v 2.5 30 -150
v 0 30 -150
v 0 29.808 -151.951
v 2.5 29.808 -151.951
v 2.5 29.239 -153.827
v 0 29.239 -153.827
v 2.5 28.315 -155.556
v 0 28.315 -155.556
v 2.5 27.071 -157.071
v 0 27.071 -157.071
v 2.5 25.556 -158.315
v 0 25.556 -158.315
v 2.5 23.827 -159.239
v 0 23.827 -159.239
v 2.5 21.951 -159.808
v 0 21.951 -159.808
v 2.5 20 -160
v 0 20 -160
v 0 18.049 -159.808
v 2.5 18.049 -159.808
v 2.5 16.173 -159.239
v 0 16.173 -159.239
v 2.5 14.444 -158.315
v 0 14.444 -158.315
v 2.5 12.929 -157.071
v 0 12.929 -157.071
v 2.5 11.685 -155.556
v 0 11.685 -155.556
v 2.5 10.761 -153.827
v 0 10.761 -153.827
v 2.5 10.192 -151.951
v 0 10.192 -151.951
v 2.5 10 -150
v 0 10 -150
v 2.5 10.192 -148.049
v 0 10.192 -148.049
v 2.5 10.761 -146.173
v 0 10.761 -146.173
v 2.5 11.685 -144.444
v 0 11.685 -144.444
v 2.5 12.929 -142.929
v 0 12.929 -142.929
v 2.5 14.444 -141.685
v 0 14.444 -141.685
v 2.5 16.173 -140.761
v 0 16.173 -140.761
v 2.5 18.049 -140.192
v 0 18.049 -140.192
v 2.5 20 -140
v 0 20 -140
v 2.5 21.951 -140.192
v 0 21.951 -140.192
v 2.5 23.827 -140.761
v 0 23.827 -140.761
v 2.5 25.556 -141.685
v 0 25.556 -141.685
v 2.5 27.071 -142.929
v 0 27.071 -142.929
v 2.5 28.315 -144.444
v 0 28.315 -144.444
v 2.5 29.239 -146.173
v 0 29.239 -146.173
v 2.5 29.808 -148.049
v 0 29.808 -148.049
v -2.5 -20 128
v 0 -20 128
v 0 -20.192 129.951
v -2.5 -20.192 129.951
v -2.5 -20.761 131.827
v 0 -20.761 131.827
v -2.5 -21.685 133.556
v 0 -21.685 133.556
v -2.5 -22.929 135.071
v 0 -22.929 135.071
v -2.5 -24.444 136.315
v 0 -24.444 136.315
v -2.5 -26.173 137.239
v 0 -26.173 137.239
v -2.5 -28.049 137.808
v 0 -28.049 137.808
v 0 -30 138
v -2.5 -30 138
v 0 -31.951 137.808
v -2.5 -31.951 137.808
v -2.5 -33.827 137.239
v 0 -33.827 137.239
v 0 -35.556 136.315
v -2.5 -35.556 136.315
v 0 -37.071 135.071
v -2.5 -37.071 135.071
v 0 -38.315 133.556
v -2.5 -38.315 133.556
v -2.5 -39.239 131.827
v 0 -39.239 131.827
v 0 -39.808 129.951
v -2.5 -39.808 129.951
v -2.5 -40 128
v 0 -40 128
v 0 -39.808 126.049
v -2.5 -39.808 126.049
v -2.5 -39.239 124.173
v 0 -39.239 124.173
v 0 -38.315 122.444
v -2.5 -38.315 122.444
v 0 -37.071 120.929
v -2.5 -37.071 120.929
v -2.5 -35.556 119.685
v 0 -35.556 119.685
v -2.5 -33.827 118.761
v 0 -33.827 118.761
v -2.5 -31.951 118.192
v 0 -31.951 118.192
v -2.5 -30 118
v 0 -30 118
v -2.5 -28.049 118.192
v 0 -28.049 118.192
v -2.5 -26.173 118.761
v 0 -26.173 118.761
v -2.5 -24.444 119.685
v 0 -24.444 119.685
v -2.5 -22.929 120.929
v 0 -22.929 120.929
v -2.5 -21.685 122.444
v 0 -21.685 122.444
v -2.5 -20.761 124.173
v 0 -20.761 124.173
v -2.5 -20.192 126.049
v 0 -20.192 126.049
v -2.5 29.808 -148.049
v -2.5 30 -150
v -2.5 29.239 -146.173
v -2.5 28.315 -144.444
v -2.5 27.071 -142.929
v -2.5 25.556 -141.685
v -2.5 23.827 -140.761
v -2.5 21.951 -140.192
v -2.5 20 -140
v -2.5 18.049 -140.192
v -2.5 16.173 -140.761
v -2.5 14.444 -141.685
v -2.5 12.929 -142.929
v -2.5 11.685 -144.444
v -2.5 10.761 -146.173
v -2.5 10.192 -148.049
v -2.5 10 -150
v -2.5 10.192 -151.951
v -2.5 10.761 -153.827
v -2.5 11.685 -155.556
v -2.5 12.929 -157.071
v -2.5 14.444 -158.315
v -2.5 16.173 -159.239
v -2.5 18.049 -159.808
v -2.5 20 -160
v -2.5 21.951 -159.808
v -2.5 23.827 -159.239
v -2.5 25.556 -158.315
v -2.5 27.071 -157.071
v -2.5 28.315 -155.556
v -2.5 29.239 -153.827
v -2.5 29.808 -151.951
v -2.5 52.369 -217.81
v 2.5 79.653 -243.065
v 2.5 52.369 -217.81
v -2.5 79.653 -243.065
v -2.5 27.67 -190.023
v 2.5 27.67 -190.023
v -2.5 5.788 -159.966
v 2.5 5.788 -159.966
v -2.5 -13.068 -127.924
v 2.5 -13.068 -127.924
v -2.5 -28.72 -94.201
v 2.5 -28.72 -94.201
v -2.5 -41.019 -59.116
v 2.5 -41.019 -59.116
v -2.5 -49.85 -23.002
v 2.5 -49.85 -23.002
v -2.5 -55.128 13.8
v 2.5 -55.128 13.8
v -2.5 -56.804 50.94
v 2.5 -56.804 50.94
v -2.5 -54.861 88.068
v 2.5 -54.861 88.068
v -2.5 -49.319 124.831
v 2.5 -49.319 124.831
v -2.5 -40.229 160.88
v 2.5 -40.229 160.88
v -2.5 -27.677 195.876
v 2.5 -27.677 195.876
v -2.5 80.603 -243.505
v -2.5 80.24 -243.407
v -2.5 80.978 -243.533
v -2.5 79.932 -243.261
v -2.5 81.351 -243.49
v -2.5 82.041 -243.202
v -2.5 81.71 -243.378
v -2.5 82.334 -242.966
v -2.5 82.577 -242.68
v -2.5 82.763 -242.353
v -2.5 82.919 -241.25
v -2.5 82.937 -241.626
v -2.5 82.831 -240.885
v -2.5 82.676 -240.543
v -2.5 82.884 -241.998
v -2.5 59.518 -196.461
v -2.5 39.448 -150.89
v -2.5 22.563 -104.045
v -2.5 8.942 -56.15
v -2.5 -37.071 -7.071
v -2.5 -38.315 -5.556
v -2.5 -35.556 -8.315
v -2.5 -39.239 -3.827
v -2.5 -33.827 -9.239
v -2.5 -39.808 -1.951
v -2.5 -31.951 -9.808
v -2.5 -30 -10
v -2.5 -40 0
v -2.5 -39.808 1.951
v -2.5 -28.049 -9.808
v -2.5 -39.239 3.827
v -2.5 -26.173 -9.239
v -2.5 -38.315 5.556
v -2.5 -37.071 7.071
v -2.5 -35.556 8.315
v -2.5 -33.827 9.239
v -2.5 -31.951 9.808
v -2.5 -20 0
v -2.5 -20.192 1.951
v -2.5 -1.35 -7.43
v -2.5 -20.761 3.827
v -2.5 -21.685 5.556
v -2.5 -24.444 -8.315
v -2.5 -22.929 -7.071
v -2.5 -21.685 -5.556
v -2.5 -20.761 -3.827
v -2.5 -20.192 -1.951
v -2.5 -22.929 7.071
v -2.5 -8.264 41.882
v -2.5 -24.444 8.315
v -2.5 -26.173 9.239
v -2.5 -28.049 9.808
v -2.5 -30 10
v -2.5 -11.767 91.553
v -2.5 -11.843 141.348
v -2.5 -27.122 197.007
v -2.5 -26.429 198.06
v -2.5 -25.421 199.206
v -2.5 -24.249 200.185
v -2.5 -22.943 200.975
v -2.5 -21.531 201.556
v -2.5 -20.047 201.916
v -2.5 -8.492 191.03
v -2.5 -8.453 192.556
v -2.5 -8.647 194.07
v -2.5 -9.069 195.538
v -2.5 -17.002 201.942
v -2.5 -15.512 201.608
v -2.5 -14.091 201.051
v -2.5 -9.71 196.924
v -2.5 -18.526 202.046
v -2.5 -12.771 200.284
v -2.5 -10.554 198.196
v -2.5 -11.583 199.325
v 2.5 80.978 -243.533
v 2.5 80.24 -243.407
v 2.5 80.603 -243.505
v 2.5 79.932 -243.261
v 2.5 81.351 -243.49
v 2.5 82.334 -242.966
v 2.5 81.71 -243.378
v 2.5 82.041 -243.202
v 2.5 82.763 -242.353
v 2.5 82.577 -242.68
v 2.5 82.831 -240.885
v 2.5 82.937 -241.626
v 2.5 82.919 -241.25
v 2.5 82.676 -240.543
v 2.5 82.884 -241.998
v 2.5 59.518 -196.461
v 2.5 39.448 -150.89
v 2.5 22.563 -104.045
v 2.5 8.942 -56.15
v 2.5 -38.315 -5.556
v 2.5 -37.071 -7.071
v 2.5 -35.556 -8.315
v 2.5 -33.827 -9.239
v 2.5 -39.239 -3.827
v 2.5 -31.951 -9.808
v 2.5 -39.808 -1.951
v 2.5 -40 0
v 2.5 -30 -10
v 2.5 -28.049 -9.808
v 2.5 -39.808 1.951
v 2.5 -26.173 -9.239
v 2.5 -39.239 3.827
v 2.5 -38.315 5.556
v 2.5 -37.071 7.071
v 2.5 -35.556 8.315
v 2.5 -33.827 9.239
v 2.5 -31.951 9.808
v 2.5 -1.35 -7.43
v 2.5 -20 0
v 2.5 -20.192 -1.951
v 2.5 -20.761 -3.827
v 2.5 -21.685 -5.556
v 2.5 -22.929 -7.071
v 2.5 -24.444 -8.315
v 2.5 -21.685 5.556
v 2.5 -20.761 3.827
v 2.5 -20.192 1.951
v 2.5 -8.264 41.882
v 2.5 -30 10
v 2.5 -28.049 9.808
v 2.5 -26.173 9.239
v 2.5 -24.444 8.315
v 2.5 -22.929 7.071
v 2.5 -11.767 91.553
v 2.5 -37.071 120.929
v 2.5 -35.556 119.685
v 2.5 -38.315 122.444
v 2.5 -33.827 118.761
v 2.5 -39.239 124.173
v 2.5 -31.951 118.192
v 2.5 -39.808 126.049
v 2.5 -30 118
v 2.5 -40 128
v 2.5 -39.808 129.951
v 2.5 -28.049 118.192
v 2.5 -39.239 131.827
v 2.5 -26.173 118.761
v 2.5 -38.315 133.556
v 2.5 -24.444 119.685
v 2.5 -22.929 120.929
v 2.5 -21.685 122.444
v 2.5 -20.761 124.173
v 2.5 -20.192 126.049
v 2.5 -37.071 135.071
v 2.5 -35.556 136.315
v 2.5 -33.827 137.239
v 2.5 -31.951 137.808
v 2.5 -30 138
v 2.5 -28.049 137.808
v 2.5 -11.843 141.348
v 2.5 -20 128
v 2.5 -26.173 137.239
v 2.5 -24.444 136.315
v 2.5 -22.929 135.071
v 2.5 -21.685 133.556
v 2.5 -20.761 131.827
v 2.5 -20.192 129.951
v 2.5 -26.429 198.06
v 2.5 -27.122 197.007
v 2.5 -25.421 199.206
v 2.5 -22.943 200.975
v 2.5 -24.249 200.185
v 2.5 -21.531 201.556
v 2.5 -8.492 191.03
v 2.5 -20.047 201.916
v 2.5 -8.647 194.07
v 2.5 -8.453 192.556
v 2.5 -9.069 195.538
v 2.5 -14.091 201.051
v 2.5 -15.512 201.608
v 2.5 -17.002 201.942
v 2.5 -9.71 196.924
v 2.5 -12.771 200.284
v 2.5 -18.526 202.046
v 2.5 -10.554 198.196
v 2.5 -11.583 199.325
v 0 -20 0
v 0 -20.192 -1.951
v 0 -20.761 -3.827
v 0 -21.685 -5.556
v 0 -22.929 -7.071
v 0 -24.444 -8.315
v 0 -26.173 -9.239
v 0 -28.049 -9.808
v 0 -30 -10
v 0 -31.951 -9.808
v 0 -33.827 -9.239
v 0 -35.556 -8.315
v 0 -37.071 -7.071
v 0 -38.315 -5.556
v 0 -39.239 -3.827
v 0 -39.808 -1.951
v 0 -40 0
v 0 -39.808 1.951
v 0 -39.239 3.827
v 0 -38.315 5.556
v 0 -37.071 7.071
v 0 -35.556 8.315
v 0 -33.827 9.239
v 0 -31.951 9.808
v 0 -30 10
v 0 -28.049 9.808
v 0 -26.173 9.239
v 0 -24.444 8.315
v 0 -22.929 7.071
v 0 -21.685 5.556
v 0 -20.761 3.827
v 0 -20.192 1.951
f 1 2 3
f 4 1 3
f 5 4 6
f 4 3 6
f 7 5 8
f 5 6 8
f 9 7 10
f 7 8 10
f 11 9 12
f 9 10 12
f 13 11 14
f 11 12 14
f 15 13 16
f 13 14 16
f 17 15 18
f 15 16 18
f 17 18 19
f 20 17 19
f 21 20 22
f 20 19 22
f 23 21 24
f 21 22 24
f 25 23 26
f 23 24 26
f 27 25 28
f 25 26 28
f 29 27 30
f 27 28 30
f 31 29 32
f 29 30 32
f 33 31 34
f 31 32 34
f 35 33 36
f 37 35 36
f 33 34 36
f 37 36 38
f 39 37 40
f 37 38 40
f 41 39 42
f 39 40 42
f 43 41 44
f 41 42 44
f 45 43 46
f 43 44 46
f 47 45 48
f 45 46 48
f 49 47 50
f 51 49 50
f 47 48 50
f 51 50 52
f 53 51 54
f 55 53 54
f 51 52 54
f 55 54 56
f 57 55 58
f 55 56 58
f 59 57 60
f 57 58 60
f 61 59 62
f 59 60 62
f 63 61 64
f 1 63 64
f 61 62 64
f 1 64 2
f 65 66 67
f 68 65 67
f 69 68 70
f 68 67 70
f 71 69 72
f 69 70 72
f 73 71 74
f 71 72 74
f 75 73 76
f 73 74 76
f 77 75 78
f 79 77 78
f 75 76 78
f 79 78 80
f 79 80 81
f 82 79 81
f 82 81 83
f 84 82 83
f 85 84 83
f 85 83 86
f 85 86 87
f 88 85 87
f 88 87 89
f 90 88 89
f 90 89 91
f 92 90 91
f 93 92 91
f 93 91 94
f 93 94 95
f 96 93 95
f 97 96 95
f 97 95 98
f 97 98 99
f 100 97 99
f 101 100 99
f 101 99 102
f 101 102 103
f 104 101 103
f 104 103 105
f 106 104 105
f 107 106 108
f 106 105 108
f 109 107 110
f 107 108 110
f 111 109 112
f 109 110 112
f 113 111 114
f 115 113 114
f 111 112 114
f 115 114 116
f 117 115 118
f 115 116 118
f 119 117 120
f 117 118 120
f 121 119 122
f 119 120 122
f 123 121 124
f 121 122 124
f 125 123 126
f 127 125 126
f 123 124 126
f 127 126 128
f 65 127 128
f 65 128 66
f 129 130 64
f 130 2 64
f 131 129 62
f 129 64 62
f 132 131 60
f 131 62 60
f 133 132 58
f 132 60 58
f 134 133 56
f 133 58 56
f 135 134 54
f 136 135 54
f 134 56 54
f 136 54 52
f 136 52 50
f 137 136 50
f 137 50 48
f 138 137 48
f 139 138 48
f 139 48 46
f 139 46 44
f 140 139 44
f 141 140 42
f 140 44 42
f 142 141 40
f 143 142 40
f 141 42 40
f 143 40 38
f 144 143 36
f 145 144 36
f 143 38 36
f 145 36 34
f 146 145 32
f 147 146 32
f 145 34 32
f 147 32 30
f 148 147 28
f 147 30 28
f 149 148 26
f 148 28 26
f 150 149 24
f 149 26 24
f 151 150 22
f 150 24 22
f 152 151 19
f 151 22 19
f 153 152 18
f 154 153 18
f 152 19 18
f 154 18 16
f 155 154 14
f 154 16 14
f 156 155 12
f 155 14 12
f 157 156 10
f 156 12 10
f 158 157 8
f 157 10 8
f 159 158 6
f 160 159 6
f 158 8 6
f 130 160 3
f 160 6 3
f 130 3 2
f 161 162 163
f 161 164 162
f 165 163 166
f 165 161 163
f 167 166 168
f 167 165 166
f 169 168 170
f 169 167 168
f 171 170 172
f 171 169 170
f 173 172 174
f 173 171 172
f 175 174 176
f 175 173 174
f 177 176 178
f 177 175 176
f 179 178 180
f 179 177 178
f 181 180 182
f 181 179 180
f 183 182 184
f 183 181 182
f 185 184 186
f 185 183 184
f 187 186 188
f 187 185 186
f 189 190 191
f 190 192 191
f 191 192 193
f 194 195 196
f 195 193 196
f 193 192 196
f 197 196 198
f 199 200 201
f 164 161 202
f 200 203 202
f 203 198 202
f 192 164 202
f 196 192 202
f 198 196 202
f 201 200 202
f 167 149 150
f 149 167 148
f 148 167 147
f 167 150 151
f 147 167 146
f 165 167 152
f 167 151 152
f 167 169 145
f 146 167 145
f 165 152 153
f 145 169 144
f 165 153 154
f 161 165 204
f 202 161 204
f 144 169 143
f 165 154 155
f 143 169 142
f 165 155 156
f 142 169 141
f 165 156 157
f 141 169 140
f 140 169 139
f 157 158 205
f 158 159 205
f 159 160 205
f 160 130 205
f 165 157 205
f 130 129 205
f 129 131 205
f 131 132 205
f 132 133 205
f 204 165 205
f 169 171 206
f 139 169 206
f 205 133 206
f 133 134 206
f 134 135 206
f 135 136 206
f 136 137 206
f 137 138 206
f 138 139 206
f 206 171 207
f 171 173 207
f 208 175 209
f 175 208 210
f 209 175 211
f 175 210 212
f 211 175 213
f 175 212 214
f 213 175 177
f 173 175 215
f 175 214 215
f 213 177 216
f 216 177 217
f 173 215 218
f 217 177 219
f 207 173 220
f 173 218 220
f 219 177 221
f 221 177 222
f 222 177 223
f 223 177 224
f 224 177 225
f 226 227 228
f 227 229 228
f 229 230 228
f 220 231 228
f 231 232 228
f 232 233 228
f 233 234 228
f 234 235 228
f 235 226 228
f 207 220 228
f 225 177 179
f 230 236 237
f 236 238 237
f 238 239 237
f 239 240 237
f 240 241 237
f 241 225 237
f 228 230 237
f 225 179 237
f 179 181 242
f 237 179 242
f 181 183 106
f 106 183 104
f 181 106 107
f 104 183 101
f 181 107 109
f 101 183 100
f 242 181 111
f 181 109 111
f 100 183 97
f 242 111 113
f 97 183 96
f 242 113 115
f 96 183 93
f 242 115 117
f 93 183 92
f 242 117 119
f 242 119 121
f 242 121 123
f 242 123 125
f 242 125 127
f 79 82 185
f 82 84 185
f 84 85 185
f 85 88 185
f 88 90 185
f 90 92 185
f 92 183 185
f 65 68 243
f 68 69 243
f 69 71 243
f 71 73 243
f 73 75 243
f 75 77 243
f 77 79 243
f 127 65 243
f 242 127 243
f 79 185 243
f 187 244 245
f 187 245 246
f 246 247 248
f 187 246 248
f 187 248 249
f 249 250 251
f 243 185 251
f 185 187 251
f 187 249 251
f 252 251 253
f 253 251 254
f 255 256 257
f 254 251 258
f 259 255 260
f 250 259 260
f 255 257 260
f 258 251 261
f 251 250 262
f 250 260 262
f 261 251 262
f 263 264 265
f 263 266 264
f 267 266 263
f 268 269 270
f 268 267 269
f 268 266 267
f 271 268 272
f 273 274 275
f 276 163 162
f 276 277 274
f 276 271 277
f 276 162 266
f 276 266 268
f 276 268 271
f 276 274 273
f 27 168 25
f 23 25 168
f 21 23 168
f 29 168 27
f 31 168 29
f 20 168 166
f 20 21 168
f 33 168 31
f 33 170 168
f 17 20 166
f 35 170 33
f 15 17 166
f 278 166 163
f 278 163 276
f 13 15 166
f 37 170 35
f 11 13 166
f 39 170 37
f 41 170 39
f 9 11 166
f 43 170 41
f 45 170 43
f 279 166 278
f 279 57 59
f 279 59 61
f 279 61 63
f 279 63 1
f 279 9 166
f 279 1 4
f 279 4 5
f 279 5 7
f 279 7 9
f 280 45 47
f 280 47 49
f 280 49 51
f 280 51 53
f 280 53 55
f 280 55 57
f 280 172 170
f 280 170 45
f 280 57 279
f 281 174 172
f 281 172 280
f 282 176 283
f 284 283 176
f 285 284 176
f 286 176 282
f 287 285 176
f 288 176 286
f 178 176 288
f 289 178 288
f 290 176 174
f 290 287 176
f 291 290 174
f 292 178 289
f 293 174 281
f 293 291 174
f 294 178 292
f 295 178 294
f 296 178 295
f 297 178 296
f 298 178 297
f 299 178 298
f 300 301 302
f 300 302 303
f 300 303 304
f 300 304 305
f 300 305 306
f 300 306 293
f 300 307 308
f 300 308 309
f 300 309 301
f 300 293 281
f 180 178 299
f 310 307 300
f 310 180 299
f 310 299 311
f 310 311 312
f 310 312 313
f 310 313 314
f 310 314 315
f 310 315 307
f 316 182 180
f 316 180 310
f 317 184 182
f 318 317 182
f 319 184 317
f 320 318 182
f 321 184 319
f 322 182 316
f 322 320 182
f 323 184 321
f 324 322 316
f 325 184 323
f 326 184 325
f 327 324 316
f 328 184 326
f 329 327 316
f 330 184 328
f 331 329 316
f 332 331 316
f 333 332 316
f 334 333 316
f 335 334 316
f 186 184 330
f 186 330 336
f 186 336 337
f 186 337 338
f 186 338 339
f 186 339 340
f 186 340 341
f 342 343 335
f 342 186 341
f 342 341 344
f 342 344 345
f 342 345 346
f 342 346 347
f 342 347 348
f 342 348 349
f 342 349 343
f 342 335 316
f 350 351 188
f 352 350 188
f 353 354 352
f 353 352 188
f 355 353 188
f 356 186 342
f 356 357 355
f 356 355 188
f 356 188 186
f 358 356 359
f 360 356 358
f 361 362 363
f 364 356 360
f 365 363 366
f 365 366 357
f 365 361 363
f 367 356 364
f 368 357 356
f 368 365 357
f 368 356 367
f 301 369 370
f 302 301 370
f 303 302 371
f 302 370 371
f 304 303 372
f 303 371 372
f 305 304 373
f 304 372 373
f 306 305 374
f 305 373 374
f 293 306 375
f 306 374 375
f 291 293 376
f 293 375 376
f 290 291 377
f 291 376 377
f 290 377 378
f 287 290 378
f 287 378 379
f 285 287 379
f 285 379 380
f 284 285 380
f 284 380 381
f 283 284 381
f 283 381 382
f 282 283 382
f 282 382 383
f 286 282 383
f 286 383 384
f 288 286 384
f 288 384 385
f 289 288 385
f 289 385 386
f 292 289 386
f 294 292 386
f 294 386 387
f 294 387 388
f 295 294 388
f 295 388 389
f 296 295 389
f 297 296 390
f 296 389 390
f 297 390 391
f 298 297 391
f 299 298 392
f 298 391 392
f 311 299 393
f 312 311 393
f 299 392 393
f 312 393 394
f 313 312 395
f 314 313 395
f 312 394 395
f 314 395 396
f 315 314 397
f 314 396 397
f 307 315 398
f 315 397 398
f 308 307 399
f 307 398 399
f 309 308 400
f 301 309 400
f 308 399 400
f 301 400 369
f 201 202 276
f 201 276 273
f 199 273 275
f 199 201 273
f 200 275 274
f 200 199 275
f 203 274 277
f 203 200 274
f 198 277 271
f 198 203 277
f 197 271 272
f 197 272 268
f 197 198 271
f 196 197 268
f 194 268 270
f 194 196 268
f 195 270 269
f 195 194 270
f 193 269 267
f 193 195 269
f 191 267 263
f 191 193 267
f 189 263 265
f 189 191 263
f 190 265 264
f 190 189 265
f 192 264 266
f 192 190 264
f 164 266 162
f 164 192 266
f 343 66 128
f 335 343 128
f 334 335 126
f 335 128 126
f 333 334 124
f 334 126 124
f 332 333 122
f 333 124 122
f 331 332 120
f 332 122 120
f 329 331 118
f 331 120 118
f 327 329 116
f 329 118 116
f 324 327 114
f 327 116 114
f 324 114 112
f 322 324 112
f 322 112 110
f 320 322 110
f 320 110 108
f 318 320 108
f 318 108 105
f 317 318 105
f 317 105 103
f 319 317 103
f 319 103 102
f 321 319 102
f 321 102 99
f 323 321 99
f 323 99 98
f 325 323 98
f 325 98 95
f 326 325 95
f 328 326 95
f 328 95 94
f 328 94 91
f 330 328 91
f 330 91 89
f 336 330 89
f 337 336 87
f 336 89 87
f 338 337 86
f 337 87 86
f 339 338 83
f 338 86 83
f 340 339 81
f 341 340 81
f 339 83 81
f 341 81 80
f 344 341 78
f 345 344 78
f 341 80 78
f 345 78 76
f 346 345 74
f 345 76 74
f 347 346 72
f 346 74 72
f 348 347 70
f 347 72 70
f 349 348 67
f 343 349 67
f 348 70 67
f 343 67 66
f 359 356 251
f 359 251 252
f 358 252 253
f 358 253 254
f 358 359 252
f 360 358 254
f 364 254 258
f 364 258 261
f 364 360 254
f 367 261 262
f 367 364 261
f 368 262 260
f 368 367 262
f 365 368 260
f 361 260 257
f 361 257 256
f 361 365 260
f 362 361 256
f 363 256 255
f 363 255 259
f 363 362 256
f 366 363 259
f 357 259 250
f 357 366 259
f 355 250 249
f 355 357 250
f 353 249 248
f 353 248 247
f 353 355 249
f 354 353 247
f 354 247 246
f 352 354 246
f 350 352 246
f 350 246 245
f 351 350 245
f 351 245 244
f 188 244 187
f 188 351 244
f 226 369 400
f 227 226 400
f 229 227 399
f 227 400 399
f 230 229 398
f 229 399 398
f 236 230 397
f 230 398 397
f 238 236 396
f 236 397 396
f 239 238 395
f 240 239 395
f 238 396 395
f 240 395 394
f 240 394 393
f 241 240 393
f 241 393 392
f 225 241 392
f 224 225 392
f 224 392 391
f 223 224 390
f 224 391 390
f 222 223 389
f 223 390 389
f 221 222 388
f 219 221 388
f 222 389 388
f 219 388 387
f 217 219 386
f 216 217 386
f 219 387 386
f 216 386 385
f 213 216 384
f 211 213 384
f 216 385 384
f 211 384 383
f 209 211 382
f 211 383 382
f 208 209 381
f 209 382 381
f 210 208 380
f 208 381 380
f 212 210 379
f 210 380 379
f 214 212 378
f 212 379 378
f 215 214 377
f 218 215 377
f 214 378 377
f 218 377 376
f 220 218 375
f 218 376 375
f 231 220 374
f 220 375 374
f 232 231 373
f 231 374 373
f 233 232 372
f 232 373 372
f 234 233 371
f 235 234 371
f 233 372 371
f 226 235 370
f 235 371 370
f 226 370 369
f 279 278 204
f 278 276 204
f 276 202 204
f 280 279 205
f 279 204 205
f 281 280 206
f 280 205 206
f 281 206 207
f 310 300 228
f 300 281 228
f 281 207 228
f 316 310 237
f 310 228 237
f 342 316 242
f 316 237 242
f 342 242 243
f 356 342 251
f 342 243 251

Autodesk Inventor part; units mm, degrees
ref_plane "YZ Plane" through (0, 0, 0) normal (1, 0, 0) x (0, 1, 0)
ref_plane "XZ Plane" through (0, 0, 0) normal (0, 1, 0) x (-1, 0, 0)
ref_plane "XY Plane" through (0, 0, 0) normal (0, 0, 1) x (1, 0, 0)
sketch "スケッチ1" plane through (0, 0, 0) normal (1, 0, 0) x (0, 1, 0)
  line L0 (0, 250) -> (88.1635, -250)
  arc A0 (0, 250) -> (88.1635, -250) centre (710.7652, 117.5543) ccw
  arc A1 (0, 250) -> (88.1635, -250) centre (325.1936, 49.5676) ccw
  line L1 (0, -370.1192) -> (0, 353.3532) projected
  point P0 (0, 0)
  dimension "d0" = 250
  dimension "d2" = 500
  dimension "d3" = 10
  dimension "d4" = 723
  dimension "d5" = 382
extrude "押し出し1" add sketch "スケッチ1" along normal mid plane 5 contours A0 L1 A1 | A1 L1 A0
sketch "スケッチ3" plane through (0, 0, 0) normal (1, 0, 0) x (0, 1, 0)
  circle A0 centre (-30, 128) radius 10
  circle A1 centre (-30, 0) radius 10
  circle A2 centre (20, -150) radius 10
  line L0 (-54, 0) -> (44, 0) projected
  line L1 (0, -219.6) -> (0, 197.6) projected
  point P0 (0, 0)
  dimension "d10" = 128
  dimension "d11" = 30
  dimension "d12" = 20
  dimension "d13" = 20
  dimension "d14" = 20
  dimension "d15" = 30
  dimension "d16" = 150
  dimension "d19" = 20
extrude "押し出し2" cut sketch "スケッチ3" along normal through all both and the other way through all
fillet "フィレット1" radius 10 1 edges at (0, 0, 250)
fillet "フィレット2" radius 2 1 edges at (0, 88.1635, -250)
properties part number "element_base" material "アルミニウム 6061"
